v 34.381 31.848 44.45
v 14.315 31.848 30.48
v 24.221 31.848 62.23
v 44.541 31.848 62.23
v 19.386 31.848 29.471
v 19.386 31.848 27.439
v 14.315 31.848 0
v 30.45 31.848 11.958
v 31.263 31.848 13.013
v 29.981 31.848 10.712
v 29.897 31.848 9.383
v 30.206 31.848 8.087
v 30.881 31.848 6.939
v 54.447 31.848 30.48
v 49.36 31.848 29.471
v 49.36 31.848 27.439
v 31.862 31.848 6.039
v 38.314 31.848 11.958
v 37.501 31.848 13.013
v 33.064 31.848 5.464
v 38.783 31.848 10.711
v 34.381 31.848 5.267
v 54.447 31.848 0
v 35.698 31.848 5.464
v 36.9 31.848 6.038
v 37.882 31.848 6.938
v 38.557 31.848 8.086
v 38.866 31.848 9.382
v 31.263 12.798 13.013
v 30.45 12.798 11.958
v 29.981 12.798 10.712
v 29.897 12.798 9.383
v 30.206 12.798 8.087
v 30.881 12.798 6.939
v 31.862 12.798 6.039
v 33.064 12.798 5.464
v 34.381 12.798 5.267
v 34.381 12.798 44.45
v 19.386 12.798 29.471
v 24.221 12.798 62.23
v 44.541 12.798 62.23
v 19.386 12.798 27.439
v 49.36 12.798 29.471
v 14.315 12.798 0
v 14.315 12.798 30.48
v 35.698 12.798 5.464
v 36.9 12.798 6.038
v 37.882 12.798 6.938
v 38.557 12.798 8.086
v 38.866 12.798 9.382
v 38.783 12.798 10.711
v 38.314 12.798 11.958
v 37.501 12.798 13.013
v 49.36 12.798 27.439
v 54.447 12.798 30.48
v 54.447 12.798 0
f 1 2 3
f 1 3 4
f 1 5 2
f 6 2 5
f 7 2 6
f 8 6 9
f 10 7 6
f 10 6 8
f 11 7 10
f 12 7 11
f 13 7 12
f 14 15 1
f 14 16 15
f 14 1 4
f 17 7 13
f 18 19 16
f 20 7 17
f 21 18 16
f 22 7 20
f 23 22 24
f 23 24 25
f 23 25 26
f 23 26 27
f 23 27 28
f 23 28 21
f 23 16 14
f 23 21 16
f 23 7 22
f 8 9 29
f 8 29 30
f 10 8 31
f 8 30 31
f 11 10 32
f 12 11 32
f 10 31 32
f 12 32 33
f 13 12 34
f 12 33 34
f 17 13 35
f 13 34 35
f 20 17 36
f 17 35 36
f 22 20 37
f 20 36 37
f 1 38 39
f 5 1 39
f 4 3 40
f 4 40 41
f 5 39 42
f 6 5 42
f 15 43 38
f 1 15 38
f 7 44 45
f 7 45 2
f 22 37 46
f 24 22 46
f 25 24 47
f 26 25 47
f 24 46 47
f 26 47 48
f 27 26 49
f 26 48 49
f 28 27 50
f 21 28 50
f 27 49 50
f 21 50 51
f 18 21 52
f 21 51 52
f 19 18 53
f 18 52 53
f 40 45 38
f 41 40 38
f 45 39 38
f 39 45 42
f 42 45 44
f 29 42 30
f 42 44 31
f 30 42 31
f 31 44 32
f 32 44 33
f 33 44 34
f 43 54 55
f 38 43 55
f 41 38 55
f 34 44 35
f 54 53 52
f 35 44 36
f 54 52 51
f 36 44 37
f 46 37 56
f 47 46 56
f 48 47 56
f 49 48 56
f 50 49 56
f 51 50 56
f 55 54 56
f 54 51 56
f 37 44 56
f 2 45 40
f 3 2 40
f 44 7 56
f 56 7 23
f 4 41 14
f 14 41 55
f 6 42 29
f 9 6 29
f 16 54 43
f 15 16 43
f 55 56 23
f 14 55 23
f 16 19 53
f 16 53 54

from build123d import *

# Parameters (mm, degrees)
F0_W     = 40.132
F0_H     = 19.05
F1_DEPTH = 62.23
F3_DEPTH = 25.4
F5_DEPTH = 25.4


with BuildPart() as f1:
    # F0 (on Top) → F1 (new body)
    with BuildSketch(Plane.XY):
        with Locations((34.380583, 22.322809)):
            Rectangle(F0_W, F0_H)
    extrude(amount=F1_DEPTH)

    # F2 (on face) → F3 (cut)
    with BuildSketch(Plane.XZ.offset(-12.797809)):
        Polygon((49.35965, 29.470933), (34.380583, 44.45), (34.380583, 29.470933), align=None)
        Polygon((34.380583, 29.470933), (34.380583, 44.45), (19.385723, 29.470933), align=None)
        with BuildLine():
            Line((49.35965, 29.470933), (34.380583, 29.470933))
            Line((34.380583, 29.470933), (34.380583, 5.267071))
            ThreePointArc((34.380583, 5.267071), (38.556777, 8.086362), (37.500633, 13.013183))
            Line((37.500633, 13.013183), (49.35965, 27.438933))
            Line((49.35965, 27.438933), (49.35965, 29.470933))
        make_face()
        with BuildLine():
            Line((34.380583, 5.267071), (34.380583, 29.470933))
            Line((34.380583, 29.470933), (19.385723, 29.470933))
            Line((19.385723, 29.470933), (19.385723, 27.438933))
            Line((19.385723, 27.438933), (31.262963, 13.013183))
            ThreePointArc((31.262963, 13.013183), (30.206365, 8.087489), (34.380583, 5.267071))
        make_face()
    extrude(amount=-F3_DEPTH, mode=Mode.SUBTRACT)

    # F4 (on face) → F5 (cut)
    with BuildSketch(Plane.XZ.offset(-12.797809)):
        Polygon((14.314583, 62.23), (14.314583, 30.48), (24.220583, 62.23), align=None)
        Polygon((54.446583, 62.23), (44.540583, 62.23), (54.446583, 30.48), align=None)
    extrude(amount=-F5_DEPTH, mode=Mode.SUBTRACT)


solid = f1.part
